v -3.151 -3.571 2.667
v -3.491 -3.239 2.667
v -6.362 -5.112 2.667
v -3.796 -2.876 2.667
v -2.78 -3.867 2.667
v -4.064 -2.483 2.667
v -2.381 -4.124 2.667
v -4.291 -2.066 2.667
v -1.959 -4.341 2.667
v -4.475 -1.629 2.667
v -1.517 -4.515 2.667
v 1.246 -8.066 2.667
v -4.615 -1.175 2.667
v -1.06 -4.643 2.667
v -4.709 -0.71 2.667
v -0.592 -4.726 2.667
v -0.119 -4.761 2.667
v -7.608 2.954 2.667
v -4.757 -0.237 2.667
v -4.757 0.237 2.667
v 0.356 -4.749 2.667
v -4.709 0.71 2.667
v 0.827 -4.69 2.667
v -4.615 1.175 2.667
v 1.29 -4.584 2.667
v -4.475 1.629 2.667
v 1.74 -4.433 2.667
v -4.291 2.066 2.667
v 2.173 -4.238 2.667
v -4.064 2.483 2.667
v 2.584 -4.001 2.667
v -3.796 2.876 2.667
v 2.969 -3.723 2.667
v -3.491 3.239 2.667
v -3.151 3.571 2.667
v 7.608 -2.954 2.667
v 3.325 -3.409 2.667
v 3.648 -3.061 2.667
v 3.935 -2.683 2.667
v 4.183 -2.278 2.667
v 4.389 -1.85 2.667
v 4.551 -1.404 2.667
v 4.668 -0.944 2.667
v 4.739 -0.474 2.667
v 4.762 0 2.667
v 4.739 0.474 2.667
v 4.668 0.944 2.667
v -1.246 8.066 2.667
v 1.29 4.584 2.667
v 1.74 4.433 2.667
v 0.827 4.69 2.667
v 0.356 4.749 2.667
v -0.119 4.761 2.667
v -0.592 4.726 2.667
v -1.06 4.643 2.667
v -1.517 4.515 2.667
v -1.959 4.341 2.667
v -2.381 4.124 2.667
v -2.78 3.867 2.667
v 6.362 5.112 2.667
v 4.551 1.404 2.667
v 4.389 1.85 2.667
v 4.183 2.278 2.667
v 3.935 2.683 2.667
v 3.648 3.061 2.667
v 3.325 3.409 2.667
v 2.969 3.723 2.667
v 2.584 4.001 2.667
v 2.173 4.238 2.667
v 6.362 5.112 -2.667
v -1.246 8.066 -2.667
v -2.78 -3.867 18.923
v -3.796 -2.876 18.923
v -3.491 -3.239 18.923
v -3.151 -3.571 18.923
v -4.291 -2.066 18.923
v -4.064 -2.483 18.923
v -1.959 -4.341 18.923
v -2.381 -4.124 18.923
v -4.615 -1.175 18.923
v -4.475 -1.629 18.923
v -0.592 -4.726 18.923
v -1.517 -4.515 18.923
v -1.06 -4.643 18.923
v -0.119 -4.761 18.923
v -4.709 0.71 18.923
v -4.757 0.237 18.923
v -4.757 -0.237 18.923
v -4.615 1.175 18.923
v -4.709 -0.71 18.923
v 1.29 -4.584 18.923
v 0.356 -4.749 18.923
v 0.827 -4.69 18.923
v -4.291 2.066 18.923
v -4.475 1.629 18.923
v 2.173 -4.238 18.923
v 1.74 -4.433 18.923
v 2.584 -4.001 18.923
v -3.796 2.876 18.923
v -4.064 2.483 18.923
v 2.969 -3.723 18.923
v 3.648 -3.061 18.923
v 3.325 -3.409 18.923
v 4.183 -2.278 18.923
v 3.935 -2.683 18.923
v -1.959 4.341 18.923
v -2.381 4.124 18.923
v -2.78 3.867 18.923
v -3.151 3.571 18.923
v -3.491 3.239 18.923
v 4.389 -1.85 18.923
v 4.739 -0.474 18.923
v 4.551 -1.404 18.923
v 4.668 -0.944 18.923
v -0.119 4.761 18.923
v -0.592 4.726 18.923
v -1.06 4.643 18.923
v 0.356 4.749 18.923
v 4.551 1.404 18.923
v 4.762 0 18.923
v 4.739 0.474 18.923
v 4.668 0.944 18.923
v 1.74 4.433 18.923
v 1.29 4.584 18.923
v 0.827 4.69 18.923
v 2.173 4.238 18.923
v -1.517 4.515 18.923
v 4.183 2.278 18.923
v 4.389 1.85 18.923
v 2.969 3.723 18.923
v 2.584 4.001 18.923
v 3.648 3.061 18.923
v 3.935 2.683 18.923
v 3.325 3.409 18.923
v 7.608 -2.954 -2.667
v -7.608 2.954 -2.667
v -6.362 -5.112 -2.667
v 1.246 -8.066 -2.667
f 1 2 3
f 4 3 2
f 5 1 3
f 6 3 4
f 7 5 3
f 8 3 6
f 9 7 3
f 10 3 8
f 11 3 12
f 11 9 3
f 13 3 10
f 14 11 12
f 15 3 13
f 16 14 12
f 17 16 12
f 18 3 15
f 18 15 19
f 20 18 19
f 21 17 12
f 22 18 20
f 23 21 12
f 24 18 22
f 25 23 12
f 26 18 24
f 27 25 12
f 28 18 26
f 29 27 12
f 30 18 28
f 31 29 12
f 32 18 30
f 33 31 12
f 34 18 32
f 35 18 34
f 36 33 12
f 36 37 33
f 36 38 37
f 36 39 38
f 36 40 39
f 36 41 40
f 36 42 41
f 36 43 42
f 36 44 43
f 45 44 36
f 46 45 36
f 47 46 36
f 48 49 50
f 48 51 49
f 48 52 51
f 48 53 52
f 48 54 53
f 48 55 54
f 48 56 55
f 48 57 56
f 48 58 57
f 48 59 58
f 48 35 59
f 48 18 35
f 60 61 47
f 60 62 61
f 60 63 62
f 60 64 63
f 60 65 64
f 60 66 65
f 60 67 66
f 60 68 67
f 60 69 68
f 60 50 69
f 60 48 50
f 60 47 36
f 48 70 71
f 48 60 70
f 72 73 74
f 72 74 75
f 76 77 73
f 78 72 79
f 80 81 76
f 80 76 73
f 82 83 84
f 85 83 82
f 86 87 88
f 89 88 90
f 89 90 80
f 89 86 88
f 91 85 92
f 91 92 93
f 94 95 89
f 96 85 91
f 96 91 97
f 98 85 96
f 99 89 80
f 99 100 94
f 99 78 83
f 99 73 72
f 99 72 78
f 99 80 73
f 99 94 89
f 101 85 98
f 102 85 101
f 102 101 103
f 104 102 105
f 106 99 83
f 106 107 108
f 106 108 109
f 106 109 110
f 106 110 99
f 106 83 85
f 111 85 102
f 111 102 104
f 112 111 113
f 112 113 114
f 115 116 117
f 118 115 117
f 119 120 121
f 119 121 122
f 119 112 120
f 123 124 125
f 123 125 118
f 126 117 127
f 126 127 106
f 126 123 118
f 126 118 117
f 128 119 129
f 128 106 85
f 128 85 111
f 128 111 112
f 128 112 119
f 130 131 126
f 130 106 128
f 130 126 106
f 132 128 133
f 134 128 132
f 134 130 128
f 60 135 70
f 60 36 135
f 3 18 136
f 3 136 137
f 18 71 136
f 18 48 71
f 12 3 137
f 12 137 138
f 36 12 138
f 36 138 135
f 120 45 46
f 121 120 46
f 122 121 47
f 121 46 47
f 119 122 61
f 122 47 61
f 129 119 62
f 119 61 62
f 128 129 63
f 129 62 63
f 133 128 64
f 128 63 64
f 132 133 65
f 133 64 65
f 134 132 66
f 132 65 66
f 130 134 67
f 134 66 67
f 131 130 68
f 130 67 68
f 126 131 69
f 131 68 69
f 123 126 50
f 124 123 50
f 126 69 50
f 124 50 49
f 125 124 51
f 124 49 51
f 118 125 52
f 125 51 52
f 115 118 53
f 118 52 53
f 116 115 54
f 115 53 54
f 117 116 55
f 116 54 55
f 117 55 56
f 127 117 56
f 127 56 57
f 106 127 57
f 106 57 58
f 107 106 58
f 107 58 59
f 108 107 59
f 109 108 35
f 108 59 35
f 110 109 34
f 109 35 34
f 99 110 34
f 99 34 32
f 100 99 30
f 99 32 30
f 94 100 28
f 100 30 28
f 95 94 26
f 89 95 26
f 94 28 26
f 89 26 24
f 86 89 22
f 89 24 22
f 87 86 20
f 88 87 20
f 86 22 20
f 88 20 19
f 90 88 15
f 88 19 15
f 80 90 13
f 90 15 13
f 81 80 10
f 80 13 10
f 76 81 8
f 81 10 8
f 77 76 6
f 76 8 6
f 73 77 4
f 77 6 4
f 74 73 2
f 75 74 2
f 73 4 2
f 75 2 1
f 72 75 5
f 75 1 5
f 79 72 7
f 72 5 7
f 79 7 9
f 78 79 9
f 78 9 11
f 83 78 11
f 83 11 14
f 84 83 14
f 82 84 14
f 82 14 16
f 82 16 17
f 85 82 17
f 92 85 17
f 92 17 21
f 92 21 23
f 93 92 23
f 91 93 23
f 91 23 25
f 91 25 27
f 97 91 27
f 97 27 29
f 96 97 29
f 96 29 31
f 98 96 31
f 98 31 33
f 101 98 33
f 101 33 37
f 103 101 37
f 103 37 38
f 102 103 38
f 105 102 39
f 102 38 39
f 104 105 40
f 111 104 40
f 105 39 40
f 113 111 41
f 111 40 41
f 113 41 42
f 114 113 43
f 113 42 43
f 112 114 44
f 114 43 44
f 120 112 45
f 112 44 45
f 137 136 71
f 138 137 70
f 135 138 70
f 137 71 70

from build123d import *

# Parameters (mm, degrees)
F1_DEPTH = 2.667
F2_R     = 4.7625
F3_DEPTH = 16.256


with BuildPart() as f1:
    # F0 (on Top) → F1 (new body, symmetric)
    with BuildSketch(Plane.XY):
        Polygon((-1.245599, 8.065583), (-7.6078, 2.954071), (-6.3622, -5.111512), (1.245599, -8.065583), (7.6078, -2.954071), (6.3622, 5.111512), align=None)
    extrude(amount=F1_DEPTH, both=True)

    # F2 (on face) → F3 (join)
    with BuildSketch(Plane.XY.offset(2.667)):
        Circle(F2_R)
    extrude(amount=F3_DEPTH)


solid = f1.part
